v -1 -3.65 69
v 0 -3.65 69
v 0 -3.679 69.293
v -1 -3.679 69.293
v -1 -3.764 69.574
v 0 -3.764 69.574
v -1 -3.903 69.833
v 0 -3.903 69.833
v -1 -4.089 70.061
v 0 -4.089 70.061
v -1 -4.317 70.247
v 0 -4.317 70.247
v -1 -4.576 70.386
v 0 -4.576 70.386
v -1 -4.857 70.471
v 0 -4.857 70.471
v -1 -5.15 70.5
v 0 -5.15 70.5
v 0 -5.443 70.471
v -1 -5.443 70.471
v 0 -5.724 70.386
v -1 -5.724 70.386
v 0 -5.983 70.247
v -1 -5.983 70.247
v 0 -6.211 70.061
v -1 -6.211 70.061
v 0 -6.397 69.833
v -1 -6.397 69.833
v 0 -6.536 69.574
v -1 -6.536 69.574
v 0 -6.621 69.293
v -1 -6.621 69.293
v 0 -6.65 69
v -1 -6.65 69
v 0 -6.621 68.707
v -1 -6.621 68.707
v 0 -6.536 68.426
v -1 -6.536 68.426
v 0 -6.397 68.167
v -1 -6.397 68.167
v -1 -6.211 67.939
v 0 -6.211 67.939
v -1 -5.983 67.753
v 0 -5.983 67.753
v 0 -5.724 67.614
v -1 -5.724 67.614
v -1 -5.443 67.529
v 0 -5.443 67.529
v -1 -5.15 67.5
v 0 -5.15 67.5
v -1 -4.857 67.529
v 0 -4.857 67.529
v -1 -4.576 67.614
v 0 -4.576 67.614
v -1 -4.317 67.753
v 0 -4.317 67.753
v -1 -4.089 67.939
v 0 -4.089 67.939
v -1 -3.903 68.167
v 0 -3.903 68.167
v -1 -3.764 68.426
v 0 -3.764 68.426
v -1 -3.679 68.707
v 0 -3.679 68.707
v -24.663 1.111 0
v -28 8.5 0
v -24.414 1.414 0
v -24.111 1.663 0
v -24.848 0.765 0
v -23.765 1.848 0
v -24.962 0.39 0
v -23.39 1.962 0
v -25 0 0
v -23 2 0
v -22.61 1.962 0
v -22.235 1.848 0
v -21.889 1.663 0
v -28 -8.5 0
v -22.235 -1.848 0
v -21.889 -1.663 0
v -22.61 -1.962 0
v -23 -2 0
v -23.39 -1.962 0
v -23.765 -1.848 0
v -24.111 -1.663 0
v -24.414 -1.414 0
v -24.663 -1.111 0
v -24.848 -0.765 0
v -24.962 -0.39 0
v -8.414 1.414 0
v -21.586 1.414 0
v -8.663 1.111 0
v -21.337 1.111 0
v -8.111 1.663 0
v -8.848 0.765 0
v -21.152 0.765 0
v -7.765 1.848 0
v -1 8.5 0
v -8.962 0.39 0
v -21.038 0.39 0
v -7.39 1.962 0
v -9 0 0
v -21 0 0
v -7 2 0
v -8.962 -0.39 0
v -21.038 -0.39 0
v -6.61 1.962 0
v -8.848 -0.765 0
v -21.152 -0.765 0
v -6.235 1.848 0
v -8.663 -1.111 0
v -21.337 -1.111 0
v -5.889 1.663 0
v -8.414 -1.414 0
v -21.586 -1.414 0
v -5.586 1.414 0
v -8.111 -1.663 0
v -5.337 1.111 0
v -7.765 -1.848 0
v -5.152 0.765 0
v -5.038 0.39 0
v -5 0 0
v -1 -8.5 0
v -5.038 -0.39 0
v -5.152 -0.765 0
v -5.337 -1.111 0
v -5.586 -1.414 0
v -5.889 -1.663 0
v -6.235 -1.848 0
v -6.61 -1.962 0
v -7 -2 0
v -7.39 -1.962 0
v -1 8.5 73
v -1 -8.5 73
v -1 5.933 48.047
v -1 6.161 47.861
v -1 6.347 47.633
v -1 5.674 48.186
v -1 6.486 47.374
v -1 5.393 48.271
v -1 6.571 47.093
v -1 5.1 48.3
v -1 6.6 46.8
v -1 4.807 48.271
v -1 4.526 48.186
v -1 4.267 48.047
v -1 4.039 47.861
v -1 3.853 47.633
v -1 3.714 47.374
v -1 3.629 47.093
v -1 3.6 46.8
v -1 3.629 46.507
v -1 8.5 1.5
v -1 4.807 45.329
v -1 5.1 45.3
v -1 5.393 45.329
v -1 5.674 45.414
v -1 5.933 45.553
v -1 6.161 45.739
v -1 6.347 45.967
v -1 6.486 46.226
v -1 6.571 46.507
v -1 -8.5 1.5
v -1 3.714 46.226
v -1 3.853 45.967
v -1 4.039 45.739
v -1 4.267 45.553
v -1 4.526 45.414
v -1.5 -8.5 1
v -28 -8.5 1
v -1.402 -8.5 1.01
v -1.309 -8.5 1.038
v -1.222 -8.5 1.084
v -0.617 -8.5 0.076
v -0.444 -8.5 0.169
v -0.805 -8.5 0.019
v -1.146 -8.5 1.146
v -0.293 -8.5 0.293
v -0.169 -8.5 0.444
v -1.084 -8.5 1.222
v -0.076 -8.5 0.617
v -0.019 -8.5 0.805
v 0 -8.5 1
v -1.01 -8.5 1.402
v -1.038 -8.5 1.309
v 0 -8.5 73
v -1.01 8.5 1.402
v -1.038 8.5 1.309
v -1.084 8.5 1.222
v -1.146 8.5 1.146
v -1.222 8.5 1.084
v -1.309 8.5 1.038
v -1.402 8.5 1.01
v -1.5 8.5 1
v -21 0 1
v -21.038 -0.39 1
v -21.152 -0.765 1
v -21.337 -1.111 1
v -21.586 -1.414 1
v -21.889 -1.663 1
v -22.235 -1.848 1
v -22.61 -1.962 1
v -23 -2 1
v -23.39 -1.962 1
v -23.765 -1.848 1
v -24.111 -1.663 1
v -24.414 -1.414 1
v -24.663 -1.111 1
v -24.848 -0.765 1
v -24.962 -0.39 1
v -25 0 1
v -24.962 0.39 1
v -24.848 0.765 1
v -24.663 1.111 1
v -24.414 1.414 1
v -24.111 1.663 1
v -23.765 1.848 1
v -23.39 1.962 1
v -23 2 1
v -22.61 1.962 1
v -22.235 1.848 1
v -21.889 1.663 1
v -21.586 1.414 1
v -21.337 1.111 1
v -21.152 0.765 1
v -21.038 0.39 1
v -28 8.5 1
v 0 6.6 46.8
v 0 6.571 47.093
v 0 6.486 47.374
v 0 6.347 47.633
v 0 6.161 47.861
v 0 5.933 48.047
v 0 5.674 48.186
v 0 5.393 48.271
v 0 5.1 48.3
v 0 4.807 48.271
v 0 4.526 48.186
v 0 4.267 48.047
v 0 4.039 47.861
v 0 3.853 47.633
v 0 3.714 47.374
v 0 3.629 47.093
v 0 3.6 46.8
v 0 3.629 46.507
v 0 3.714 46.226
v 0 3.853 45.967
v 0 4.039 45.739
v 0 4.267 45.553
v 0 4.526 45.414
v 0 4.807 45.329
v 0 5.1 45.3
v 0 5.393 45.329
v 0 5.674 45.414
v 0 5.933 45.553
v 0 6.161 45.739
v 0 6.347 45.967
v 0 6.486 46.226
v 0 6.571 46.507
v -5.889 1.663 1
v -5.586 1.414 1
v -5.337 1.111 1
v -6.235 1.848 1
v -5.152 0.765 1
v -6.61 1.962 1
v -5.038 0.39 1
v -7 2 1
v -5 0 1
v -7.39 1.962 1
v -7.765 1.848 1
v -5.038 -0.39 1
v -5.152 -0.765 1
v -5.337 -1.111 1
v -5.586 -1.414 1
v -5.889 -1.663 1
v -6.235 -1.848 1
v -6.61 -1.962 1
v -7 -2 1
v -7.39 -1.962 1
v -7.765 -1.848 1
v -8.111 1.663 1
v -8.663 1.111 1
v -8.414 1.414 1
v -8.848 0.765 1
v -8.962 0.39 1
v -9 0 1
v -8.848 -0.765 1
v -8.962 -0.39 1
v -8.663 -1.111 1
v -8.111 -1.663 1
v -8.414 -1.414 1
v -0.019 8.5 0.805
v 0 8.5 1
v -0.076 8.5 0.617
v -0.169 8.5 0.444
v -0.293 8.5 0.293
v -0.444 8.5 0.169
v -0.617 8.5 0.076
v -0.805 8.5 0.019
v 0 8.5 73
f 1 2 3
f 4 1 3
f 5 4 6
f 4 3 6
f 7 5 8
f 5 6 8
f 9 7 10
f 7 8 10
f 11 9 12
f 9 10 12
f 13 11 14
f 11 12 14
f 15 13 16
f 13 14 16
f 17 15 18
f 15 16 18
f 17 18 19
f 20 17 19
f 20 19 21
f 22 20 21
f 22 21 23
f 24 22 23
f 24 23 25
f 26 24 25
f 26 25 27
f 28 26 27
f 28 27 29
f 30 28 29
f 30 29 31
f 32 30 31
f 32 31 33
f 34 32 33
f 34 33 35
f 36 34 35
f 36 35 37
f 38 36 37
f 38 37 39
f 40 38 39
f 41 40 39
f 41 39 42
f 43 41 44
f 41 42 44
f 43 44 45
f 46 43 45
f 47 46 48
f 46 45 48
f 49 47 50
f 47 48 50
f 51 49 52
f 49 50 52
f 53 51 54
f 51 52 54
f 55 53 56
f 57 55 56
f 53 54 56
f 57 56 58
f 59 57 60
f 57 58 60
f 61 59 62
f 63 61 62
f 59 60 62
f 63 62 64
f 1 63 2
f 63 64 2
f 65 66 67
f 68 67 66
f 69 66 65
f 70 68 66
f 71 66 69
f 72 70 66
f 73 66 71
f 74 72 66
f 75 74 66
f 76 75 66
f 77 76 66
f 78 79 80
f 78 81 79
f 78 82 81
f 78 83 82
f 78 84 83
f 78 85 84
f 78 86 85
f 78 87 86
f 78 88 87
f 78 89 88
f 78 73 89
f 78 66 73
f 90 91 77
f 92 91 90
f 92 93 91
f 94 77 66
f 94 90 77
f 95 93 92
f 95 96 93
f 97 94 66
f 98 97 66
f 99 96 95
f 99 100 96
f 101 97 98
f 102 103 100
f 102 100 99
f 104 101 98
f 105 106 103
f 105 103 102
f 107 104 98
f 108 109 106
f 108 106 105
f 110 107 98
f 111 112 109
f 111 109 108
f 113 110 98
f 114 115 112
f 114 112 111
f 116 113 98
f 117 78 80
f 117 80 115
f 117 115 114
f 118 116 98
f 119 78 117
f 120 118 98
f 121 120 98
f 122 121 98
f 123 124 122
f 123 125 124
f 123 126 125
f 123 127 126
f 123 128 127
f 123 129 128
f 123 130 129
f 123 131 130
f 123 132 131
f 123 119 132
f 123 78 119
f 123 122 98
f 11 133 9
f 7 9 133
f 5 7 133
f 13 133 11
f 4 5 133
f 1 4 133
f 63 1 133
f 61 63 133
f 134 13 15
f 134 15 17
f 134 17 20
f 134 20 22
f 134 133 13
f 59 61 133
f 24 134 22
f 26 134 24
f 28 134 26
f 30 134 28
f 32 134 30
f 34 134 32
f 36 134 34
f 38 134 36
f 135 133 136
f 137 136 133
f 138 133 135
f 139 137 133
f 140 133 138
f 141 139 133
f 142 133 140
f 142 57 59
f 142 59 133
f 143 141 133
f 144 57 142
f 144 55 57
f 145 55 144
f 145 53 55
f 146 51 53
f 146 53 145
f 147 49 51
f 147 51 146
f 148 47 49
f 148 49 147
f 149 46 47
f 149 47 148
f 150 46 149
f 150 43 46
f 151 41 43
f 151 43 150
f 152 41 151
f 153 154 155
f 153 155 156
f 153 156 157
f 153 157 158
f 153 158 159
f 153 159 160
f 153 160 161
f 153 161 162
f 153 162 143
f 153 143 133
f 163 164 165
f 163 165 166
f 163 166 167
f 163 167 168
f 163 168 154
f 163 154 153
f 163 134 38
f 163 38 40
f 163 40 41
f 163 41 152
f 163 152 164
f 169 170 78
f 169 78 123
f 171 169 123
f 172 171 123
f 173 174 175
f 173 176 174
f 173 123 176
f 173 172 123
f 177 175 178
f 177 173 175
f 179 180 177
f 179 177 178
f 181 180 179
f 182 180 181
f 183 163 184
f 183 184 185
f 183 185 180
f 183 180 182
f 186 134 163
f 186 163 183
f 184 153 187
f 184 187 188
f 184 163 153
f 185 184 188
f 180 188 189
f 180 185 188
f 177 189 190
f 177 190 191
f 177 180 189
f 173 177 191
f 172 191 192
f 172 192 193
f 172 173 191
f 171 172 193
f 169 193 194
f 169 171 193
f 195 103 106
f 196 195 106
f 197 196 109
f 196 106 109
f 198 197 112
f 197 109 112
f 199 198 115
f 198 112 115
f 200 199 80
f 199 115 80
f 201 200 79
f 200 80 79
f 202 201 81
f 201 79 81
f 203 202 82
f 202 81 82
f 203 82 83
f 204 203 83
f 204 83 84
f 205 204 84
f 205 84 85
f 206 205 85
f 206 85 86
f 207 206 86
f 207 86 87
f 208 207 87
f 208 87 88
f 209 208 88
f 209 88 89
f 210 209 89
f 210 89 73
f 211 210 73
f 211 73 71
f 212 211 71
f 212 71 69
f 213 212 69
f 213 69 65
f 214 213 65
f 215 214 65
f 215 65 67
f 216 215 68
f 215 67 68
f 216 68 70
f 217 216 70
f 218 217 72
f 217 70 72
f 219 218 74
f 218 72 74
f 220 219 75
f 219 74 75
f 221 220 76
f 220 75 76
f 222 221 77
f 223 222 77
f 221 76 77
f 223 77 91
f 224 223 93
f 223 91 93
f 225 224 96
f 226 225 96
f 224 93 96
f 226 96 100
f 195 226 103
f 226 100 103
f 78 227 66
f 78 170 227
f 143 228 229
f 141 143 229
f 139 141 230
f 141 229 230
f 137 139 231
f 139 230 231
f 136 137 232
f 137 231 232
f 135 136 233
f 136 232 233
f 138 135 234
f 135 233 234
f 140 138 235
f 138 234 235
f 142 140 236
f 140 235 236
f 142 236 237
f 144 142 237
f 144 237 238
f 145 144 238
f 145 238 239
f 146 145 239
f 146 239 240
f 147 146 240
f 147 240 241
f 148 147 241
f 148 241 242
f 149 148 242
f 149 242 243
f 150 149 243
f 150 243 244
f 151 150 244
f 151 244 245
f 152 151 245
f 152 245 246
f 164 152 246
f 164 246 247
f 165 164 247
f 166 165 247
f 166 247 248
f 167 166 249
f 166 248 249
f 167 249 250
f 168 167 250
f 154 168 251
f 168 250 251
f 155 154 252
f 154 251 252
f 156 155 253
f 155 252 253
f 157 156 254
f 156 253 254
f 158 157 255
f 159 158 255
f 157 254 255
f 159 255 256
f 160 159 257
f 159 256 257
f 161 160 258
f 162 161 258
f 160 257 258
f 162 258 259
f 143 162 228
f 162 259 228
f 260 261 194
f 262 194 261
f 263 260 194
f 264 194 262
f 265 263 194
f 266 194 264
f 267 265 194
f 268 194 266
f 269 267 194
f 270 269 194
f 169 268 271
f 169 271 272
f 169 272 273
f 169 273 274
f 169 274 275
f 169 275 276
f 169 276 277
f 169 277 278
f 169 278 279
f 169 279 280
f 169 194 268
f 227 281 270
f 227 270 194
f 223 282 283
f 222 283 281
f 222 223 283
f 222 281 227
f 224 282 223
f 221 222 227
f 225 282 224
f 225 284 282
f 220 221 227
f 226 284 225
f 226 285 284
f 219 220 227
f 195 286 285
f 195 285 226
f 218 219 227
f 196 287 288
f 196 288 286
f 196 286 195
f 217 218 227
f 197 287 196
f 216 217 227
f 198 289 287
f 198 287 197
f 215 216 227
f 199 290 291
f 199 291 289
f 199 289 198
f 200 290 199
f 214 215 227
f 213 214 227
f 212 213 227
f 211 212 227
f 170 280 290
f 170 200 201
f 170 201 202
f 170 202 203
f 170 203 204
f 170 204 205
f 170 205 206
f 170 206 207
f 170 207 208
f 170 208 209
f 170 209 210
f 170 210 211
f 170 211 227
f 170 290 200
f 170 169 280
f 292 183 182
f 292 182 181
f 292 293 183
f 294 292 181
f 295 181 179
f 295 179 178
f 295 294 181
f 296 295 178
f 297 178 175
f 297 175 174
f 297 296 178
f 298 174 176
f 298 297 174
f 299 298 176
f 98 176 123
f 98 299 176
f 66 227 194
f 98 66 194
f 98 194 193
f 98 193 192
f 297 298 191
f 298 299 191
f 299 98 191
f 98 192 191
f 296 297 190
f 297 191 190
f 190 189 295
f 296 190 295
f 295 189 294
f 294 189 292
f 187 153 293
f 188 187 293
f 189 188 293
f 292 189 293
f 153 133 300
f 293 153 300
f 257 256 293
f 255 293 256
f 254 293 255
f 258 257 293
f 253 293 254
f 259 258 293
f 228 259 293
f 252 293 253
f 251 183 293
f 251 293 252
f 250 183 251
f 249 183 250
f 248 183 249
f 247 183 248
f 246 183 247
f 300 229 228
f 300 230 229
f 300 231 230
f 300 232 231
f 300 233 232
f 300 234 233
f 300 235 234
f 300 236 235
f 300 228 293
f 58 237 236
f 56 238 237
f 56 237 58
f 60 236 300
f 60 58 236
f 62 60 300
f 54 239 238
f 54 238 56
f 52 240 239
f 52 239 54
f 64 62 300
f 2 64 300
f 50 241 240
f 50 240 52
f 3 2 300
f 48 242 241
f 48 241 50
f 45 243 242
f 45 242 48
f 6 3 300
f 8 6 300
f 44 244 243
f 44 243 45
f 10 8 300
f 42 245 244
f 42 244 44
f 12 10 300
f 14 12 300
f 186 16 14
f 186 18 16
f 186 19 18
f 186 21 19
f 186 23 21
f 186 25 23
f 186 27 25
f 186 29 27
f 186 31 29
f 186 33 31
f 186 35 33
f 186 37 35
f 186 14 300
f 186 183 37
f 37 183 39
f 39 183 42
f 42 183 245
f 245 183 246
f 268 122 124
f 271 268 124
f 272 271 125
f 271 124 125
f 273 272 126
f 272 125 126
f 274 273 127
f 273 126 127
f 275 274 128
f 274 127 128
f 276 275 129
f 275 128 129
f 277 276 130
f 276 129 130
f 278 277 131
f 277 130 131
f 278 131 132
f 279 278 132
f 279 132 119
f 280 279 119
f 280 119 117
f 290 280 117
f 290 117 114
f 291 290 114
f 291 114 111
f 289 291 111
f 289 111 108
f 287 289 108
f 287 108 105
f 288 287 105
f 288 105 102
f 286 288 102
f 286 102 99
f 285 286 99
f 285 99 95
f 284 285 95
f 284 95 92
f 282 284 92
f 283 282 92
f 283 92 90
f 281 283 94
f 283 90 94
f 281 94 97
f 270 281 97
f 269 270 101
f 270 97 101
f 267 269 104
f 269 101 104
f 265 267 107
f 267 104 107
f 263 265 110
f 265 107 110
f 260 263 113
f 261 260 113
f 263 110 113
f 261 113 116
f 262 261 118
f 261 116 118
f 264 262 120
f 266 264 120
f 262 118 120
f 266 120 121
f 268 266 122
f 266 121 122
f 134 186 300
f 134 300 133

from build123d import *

# Parameters (mm, degrees)
F1_DEPTH = 8.5
F2_R     = 1
F3_R     = 0.5
F4_R     = 2
F5_DEPTH = 3
F6_R     = 1.5
F7_DEPTH = 3


with BuildPart() as f1:
    # F0 (on Front) → F1 (new body, symmetric)
    with BuildSketch(Plane.XZ):
        Polygon((0, 0), (0, 73), (-1, 73), (-1, 1), (-28, 1), (-28, 0), align=None)
    extrude(amount=F1_DEPTH, both=True)

    # F2
    f2_edges = [f1.edges().sort_by_distance(p)[0] for p in [
        (0, 0, 0),
    ]]
    fillet(f2_edges, radius=F2_R)

    # F3
    f3_edges = [f1.edges().sort_by_distance(p)[0] for p in [
        (-1, 0, 1),
    ]]
    fillet(f3_edges, radius=F3_R)

    # F4 (on face) → F5 (cut)
    with BuildSketch(Plane(origin=(0, 0, 0), x_dir=(1, 0, 0), z_dir=(0, 0, -1))):
        with Locations((-23, 0)):
            Circle(F4_R)
        with Locations((-7, 0)):
            Circle(F4_R)
    extrude(amount=-F5_DEPTH, mode=Mode.SUBTRACT)

    # F6 (on face) → F7 (cut)
    with BuildSketch(Plane.YZ):
        with Locations((5.1, 46.8)):
            Circle(F6_R)
        with Locations((-5.15, 69)):
            Circle(F6_R)
    extrude(amount=-F7_DEPTH, mode=Mode.SUBTRACT)


solid = f1.part
